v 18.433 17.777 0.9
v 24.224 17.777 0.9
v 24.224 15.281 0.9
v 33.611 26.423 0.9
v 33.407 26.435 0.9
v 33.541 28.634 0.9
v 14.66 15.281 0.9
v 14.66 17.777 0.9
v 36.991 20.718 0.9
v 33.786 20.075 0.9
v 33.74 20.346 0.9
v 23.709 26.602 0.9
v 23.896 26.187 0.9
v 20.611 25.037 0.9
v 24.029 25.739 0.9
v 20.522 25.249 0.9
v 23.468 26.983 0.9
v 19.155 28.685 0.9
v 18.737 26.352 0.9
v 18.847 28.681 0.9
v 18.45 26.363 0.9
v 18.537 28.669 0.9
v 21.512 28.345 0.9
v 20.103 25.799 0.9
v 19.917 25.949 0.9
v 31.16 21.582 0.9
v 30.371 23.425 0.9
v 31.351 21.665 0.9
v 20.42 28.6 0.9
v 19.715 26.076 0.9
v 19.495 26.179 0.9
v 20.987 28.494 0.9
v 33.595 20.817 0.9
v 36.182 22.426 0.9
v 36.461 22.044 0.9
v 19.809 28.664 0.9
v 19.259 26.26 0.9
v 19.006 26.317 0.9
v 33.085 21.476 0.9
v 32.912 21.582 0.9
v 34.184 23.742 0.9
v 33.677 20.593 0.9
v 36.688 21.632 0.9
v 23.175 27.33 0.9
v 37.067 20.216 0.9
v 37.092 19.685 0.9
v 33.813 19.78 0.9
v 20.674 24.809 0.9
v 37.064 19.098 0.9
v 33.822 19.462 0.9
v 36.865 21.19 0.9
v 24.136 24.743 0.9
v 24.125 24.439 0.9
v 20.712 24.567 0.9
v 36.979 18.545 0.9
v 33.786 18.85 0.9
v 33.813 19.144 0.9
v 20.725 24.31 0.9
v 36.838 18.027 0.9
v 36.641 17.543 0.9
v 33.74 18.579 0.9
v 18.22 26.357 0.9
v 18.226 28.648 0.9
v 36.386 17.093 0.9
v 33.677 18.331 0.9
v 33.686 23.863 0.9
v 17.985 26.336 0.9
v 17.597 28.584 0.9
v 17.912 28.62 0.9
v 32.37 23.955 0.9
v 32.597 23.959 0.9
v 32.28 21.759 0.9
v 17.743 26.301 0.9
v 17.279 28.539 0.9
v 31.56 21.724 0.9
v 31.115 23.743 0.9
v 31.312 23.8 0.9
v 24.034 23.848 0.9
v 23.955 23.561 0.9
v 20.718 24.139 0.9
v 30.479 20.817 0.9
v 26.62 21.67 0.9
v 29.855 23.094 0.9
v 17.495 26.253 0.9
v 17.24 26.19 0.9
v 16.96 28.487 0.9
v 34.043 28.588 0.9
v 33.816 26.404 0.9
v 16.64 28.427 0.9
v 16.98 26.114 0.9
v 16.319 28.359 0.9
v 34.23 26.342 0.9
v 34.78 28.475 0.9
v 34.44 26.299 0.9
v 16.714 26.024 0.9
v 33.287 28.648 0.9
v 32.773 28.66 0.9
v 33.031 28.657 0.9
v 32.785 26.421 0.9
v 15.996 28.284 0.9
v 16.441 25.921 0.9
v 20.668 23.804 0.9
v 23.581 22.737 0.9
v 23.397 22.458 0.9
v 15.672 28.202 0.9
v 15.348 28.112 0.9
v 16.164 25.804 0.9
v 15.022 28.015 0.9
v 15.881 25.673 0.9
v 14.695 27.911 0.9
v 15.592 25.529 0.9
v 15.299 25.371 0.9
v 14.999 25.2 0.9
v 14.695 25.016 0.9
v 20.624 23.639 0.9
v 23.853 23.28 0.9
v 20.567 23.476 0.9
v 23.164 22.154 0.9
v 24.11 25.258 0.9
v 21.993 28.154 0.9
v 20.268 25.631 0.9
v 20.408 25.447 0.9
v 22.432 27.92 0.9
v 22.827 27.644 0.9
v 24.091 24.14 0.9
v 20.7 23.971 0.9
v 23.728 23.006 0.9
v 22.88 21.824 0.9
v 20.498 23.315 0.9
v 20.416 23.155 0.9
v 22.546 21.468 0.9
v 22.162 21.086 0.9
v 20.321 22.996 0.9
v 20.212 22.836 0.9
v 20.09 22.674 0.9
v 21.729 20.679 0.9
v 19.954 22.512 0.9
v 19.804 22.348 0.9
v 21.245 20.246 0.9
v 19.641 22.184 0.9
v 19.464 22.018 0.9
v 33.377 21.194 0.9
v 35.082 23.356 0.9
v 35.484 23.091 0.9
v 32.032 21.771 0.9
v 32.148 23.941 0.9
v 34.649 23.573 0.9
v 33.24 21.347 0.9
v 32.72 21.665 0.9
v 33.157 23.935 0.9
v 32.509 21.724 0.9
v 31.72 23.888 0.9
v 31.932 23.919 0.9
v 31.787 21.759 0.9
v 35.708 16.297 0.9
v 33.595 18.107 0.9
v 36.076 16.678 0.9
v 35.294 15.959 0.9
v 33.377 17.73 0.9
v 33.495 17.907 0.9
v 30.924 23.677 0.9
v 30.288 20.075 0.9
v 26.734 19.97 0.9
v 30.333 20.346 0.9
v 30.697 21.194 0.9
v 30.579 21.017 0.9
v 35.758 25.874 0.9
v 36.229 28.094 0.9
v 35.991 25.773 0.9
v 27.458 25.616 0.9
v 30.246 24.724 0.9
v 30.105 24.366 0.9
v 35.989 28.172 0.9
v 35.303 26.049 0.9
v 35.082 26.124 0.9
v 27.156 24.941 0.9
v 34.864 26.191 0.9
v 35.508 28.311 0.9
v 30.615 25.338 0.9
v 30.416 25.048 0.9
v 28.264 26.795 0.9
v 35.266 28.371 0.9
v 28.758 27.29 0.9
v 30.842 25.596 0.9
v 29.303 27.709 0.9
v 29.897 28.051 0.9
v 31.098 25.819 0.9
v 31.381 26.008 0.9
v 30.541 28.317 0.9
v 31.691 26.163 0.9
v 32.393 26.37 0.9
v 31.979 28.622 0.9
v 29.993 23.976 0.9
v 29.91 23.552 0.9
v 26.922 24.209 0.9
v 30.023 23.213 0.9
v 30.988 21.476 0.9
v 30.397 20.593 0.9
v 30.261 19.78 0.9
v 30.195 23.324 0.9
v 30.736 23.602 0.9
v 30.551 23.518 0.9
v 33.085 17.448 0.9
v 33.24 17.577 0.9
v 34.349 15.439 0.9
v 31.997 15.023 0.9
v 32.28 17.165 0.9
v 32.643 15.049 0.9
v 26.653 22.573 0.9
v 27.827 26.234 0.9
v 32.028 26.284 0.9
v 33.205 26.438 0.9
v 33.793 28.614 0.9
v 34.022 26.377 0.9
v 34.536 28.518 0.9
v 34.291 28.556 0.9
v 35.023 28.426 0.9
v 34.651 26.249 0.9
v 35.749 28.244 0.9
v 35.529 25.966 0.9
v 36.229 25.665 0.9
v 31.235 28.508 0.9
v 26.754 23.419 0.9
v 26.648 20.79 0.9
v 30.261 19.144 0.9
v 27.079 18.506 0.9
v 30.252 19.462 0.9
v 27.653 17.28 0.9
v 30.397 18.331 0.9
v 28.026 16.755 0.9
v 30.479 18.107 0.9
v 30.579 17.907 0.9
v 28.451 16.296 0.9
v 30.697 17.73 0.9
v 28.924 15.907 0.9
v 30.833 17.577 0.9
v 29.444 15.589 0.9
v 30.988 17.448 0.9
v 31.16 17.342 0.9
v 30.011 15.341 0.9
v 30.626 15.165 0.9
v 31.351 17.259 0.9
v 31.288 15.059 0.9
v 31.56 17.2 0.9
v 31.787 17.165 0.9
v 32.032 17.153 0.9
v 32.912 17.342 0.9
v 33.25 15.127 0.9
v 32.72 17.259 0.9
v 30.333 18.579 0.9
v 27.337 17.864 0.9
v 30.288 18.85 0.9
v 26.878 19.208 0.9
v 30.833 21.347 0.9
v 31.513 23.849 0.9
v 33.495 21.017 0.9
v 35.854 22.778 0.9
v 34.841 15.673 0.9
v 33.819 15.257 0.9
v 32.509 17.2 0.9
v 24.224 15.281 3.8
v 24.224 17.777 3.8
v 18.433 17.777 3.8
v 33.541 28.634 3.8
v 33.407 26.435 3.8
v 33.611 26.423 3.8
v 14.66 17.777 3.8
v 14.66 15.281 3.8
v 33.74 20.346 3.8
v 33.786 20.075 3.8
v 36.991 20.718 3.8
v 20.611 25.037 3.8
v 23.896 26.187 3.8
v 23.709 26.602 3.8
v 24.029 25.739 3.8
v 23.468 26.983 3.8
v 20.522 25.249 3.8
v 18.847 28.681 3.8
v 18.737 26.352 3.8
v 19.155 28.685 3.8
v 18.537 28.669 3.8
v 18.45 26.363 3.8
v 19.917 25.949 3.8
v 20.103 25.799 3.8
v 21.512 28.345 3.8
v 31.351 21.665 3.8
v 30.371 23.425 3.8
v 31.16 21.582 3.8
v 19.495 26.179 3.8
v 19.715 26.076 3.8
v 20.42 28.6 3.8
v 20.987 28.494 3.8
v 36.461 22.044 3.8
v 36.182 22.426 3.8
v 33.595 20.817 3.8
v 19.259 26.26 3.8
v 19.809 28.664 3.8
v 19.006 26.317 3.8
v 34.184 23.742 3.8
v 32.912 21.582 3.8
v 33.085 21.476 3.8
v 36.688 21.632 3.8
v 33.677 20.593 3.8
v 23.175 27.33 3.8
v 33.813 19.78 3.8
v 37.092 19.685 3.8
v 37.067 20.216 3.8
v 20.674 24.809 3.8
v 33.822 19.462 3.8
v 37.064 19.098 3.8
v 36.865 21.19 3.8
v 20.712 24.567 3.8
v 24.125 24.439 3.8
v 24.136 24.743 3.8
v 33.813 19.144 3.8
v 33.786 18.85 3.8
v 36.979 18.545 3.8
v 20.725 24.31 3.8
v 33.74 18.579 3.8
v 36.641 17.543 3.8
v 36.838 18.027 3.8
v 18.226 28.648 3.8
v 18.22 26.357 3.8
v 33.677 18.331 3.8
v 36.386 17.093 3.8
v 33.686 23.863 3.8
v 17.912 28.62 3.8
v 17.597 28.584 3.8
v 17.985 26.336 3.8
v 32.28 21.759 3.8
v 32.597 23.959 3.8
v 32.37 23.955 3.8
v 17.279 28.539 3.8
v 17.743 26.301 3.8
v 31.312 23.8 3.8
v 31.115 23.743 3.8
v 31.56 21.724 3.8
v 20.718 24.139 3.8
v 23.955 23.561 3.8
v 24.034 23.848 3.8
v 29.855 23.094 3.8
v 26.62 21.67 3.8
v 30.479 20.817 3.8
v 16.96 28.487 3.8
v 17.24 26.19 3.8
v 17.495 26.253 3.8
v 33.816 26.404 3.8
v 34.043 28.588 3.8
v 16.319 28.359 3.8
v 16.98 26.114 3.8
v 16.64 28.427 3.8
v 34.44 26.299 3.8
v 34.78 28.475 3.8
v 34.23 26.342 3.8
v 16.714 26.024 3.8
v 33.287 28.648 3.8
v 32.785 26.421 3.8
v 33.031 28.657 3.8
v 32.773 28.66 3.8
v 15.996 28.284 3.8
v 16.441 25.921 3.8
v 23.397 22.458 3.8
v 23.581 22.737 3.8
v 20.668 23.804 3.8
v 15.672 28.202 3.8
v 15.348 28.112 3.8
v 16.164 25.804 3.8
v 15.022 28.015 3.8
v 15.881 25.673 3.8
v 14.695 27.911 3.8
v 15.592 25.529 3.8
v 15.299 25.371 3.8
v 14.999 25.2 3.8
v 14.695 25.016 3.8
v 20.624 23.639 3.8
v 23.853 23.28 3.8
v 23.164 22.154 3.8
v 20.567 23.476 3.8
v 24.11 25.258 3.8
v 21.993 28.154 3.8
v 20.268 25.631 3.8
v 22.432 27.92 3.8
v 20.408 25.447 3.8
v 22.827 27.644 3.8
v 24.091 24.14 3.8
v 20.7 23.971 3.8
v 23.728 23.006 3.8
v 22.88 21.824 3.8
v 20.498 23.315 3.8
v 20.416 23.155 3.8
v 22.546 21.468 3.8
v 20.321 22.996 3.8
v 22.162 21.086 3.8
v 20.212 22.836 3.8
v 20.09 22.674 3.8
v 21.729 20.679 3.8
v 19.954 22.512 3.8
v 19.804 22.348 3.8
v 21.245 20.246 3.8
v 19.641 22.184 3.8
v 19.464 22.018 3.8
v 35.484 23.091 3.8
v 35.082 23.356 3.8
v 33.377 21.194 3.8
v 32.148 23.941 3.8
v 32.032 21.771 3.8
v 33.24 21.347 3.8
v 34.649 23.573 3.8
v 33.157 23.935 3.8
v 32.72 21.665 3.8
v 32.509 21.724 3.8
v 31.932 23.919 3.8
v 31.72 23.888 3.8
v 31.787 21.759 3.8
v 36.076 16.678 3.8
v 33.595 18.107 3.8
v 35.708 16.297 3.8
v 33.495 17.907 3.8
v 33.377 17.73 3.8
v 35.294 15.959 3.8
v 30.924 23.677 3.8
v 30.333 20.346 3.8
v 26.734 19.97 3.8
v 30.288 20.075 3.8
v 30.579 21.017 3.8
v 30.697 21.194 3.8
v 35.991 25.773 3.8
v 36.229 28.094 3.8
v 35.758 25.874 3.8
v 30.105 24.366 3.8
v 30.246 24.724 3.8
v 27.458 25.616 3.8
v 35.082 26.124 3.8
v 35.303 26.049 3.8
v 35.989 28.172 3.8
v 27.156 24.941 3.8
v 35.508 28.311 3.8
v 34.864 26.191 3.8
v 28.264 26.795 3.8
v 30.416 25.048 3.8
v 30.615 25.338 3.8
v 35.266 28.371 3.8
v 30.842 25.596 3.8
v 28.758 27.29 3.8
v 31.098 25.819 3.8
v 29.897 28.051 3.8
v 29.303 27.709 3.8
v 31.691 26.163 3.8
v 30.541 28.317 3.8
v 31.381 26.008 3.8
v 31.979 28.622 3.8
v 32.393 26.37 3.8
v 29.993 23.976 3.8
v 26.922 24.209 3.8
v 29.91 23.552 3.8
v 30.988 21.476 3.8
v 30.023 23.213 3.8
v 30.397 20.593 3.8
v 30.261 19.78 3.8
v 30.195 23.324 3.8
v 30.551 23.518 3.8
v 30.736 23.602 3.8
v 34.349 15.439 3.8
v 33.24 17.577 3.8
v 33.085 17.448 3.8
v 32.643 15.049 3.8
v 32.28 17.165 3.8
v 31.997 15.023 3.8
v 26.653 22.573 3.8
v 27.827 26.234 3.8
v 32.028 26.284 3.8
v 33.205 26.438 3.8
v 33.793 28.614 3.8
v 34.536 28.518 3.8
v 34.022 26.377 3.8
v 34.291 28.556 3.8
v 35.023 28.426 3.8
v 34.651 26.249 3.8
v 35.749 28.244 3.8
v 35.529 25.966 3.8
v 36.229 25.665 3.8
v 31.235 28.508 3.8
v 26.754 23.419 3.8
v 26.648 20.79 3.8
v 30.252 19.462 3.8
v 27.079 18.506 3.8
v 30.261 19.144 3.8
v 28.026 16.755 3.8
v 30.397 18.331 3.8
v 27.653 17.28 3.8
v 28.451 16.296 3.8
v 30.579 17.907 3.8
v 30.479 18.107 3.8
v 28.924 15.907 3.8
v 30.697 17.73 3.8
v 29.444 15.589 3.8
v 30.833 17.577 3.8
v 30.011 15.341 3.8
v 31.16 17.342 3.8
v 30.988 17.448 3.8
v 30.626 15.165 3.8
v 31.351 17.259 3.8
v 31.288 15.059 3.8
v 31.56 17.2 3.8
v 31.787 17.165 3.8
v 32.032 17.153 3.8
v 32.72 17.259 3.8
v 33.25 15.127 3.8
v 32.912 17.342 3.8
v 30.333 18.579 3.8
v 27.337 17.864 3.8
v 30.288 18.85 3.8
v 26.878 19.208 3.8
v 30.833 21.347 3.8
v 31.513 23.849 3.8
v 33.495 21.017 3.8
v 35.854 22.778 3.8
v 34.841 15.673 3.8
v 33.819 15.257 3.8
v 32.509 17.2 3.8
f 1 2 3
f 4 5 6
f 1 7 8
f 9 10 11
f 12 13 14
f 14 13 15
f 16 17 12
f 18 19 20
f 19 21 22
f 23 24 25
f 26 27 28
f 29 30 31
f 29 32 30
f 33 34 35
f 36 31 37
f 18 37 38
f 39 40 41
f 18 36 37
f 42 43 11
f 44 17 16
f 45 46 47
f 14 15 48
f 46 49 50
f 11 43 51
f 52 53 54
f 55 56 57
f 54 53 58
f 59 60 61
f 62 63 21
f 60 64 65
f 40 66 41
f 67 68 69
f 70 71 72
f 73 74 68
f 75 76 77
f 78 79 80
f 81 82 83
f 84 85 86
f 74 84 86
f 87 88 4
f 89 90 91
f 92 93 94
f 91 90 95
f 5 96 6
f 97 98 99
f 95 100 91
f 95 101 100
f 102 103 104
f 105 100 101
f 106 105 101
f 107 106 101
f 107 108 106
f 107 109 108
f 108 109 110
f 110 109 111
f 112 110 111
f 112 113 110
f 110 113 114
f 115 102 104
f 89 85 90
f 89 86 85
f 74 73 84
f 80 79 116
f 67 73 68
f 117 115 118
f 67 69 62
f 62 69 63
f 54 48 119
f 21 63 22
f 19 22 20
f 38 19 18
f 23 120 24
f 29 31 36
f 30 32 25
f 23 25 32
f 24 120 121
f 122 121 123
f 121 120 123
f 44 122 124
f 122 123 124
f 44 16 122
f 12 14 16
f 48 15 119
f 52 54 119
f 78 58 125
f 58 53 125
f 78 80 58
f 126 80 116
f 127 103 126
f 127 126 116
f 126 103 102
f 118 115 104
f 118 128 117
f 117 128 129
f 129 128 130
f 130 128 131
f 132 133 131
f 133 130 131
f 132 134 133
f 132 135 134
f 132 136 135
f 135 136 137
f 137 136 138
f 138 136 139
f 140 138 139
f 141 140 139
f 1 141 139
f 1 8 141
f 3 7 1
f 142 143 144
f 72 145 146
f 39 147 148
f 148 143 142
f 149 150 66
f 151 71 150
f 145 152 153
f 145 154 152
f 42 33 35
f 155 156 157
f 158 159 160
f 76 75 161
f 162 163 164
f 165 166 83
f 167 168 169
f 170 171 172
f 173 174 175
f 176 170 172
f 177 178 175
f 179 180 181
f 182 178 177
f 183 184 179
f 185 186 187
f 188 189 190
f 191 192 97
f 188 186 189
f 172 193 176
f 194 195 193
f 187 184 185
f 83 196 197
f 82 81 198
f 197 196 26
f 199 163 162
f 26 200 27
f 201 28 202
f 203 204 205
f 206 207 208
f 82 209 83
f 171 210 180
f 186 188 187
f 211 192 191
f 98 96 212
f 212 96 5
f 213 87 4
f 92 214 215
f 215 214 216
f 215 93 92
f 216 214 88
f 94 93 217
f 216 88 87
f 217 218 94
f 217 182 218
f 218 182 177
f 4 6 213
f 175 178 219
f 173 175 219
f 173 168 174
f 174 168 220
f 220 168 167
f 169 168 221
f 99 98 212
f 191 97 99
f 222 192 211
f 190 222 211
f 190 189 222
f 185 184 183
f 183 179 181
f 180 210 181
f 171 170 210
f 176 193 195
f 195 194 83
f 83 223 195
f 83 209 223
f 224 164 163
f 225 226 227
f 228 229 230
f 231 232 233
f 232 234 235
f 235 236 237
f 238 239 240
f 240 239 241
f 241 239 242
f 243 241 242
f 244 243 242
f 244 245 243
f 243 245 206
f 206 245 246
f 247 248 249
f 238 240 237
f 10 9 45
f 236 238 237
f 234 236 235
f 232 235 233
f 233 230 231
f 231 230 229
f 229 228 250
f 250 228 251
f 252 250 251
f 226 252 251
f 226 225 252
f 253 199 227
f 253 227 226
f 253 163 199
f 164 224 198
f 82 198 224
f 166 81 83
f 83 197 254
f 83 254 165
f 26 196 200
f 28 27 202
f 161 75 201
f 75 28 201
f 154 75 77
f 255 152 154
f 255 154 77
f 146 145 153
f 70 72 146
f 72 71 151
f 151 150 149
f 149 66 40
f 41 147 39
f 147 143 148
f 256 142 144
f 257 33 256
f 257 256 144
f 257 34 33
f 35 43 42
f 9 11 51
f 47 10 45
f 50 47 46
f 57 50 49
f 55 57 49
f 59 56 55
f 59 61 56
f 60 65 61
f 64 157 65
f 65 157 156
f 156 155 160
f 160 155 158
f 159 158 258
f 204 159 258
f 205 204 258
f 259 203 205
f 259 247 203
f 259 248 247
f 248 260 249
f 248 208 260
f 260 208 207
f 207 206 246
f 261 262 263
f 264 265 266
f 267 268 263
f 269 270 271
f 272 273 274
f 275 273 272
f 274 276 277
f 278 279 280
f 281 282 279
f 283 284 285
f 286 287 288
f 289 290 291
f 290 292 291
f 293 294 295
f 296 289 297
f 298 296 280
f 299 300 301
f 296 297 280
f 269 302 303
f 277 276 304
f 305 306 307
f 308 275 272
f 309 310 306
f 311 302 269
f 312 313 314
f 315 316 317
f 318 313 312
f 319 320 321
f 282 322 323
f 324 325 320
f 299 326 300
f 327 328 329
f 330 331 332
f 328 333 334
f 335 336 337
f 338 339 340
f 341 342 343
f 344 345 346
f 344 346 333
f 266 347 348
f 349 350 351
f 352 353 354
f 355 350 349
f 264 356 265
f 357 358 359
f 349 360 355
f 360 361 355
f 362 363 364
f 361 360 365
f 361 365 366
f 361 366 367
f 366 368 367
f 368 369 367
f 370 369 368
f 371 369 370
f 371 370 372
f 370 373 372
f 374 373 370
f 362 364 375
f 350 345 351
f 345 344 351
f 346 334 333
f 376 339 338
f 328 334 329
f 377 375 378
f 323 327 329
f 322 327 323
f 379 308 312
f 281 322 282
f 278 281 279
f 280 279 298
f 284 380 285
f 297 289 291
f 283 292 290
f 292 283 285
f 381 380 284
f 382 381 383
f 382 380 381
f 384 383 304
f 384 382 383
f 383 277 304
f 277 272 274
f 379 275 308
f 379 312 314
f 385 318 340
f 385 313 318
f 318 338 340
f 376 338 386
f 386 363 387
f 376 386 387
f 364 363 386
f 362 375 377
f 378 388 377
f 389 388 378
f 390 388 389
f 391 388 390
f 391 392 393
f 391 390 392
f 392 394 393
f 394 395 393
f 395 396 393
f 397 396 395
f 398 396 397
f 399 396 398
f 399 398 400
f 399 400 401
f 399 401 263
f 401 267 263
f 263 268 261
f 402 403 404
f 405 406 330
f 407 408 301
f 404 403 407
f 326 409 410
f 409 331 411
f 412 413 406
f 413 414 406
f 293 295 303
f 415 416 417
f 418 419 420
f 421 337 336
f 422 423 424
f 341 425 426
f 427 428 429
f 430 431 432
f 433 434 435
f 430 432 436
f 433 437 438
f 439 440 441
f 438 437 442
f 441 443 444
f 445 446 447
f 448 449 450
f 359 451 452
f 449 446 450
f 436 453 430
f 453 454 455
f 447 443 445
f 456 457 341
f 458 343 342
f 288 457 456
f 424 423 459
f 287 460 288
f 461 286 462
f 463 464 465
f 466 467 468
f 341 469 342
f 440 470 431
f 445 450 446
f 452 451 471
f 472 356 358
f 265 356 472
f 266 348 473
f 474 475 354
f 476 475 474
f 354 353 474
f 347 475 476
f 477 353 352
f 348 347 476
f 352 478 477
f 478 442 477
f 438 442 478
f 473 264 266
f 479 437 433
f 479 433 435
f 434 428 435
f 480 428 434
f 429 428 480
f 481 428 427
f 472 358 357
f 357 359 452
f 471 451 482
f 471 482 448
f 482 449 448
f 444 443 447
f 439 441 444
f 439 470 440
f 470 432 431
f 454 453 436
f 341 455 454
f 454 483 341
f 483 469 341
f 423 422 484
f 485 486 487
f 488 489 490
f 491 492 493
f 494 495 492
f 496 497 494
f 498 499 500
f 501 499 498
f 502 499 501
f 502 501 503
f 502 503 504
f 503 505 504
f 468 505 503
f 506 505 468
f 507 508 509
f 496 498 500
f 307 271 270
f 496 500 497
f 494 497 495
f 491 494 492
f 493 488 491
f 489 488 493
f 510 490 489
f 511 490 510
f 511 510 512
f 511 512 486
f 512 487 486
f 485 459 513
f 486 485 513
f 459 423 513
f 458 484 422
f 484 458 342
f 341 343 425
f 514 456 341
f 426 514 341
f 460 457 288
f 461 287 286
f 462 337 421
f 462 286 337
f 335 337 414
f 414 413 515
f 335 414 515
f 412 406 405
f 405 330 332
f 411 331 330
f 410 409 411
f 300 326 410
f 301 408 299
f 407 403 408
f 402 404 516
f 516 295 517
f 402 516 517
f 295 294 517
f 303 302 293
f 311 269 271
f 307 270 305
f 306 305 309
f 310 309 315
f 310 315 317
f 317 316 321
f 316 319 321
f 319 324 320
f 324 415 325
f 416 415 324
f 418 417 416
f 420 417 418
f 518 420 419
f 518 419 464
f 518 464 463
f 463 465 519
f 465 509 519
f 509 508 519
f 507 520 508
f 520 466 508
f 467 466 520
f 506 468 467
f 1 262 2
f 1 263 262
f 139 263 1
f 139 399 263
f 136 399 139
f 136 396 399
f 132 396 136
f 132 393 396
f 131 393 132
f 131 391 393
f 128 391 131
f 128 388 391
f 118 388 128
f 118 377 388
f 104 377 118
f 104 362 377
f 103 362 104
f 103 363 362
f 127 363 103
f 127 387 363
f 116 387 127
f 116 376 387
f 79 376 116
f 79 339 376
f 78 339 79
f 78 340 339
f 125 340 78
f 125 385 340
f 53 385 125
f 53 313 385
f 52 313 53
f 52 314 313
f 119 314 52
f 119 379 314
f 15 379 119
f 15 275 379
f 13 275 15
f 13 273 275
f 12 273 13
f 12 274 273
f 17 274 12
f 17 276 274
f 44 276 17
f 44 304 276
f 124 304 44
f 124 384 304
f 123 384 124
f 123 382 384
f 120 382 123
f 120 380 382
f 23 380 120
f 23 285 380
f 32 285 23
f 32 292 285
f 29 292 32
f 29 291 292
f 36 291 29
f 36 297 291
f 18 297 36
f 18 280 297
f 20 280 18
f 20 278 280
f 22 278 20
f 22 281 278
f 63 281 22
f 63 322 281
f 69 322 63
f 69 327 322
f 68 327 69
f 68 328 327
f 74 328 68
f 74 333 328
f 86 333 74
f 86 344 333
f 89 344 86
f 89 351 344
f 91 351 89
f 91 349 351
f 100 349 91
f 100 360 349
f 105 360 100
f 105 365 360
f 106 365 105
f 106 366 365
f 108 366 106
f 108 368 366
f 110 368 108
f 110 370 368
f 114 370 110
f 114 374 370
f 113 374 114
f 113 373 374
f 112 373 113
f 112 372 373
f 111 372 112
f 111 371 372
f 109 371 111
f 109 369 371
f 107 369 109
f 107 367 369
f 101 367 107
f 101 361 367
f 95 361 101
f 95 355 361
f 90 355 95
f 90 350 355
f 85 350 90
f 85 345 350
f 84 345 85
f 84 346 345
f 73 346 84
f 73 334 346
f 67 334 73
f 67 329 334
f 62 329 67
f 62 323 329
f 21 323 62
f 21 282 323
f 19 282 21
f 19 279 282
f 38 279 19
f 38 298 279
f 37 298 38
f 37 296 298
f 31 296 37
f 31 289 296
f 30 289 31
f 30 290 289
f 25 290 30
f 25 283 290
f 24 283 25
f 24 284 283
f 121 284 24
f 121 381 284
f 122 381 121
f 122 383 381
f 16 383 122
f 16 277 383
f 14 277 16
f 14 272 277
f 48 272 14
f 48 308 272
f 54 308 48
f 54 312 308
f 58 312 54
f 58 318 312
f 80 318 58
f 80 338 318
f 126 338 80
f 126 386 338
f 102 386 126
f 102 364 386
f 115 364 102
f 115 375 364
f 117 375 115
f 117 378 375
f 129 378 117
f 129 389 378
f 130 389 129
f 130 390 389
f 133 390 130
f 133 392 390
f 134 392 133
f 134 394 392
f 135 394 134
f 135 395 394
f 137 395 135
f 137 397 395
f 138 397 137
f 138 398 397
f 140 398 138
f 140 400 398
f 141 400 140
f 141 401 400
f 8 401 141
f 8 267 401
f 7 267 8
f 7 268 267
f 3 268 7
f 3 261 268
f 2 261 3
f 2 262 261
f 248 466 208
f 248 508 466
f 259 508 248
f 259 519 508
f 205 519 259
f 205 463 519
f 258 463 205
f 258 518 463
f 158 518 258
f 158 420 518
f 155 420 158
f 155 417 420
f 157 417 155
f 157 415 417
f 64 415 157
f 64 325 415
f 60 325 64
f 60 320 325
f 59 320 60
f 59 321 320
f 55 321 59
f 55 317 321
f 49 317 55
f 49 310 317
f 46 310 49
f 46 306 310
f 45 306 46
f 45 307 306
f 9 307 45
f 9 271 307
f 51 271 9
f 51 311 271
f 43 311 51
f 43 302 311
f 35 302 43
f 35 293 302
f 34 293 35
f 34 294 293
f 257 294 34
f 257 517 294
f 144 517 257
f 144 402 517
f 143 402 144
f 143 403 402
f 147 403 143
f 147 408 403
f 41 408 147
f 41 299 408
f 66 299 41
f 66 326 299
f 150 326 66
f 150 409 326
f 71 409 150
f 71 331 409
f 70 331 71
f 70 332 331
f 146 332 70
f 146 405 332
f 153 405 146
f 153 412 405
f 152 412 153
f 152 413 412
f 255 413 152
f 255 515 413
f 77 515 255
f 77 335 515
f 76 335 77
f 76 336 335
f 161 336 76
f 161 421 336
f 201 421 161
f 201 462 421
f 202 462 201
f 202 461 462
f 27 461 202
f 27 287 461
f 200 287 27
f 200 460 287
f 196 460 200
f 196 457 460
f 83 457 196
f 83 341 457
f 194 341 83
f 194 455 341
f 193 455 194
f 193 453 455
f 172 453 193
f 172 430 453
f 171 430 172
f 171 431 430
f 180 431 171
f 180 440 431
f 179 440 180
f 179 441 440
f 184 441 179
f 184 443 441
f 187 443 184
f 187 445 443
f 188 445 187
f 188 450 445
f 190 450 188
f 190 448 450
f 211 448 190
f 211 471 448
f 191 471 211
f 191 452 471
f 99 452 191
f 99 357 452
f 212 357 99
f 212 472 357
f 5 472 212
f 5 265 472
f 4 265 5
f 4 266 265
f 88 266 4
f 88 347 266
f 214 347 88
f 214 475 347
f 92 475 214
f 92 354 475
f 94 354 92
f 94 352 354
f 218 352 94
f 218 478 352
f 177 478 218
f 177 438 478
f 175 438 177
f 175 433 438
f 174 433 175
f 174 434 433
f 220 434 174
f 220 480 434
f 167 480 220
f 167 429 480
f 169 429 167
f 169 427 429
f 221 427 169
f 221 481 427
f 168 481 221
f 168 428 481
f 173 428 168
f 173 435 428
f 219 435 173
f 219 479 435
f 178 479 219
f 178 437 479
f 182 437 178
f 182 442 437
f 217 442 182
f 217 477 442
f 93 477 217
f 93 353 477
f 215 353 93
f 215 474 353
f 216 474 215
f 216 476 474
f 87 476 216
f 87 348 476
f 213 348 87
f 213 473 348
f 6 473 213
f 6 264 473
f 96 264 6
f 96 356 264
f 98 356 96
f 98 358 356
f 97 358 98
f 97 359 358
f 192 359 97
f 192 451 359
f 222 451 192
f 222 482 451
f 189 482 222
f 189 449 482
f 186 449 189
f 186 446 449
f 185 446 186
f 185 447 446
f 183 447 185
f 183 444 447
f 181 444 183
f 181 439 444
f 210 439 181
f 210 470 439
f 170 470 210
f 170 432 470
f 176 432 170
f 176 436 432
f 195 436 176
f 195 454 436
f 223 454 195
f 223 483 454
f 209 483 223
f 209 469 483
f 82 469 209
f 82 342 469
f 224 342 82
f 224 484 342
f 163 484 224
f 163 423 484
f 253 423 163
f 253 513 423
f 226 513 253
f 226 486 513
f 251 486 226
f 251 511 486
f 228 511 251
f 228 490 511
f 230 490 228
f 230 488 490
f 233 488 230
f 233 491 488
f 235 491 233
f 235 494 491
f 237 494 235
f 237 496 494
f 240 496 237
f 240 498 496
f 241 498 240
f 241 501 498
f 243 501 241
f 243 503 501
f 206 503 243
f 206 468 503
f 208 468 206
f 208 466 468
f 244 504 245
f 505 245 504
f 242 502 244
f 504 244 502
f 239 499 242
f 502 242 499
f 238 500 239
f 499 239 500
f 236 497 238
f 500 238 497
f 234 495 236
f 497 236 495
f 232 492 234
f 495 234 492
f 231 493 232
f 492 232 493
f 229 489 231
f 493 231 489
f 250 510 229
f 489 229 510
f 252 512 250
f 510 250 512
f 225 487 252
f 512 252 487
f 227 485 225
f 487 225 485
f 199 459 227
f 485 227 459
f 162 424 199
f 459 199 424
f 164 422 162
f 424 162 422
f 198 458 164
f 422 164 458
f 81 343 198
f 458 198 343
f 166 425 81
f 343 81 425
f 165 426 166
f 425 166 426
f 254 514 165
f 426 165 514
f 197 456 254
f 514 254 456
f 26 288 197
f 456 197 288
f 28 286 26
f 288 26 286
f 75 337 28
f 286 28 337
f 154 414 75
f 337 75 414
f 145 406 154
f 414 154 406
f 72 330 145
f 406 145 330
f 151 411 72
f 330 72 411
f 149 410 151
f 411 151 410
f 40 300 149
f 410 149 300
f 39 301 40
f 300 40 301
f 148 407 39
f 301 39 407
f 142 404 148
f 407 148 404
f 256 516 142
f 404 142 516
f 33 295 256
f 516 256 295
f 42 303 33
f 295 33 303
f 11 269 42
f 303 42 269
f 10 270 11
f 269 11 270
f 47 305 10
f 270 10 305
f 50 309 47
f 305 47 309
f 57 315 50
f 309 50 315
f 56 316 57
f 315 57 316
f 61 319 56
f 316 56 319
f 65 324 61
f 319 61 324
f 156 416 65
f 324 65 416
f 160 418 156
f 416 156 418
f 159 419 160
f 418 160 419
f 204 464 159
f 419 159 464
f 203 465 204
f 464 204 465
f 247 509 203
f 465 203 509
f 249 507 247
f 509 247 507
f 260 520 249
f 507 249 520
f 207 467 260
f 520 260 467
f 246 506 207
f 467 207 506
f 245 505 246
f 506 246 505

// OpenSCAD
$fn = 48;
  translate([25.500, 21.700, 0.900])
    linear_extrude(height=2.900)
      text("26", size=13.000, halign="center", valign="center", font="Helvetica Neue:style=Bold");
